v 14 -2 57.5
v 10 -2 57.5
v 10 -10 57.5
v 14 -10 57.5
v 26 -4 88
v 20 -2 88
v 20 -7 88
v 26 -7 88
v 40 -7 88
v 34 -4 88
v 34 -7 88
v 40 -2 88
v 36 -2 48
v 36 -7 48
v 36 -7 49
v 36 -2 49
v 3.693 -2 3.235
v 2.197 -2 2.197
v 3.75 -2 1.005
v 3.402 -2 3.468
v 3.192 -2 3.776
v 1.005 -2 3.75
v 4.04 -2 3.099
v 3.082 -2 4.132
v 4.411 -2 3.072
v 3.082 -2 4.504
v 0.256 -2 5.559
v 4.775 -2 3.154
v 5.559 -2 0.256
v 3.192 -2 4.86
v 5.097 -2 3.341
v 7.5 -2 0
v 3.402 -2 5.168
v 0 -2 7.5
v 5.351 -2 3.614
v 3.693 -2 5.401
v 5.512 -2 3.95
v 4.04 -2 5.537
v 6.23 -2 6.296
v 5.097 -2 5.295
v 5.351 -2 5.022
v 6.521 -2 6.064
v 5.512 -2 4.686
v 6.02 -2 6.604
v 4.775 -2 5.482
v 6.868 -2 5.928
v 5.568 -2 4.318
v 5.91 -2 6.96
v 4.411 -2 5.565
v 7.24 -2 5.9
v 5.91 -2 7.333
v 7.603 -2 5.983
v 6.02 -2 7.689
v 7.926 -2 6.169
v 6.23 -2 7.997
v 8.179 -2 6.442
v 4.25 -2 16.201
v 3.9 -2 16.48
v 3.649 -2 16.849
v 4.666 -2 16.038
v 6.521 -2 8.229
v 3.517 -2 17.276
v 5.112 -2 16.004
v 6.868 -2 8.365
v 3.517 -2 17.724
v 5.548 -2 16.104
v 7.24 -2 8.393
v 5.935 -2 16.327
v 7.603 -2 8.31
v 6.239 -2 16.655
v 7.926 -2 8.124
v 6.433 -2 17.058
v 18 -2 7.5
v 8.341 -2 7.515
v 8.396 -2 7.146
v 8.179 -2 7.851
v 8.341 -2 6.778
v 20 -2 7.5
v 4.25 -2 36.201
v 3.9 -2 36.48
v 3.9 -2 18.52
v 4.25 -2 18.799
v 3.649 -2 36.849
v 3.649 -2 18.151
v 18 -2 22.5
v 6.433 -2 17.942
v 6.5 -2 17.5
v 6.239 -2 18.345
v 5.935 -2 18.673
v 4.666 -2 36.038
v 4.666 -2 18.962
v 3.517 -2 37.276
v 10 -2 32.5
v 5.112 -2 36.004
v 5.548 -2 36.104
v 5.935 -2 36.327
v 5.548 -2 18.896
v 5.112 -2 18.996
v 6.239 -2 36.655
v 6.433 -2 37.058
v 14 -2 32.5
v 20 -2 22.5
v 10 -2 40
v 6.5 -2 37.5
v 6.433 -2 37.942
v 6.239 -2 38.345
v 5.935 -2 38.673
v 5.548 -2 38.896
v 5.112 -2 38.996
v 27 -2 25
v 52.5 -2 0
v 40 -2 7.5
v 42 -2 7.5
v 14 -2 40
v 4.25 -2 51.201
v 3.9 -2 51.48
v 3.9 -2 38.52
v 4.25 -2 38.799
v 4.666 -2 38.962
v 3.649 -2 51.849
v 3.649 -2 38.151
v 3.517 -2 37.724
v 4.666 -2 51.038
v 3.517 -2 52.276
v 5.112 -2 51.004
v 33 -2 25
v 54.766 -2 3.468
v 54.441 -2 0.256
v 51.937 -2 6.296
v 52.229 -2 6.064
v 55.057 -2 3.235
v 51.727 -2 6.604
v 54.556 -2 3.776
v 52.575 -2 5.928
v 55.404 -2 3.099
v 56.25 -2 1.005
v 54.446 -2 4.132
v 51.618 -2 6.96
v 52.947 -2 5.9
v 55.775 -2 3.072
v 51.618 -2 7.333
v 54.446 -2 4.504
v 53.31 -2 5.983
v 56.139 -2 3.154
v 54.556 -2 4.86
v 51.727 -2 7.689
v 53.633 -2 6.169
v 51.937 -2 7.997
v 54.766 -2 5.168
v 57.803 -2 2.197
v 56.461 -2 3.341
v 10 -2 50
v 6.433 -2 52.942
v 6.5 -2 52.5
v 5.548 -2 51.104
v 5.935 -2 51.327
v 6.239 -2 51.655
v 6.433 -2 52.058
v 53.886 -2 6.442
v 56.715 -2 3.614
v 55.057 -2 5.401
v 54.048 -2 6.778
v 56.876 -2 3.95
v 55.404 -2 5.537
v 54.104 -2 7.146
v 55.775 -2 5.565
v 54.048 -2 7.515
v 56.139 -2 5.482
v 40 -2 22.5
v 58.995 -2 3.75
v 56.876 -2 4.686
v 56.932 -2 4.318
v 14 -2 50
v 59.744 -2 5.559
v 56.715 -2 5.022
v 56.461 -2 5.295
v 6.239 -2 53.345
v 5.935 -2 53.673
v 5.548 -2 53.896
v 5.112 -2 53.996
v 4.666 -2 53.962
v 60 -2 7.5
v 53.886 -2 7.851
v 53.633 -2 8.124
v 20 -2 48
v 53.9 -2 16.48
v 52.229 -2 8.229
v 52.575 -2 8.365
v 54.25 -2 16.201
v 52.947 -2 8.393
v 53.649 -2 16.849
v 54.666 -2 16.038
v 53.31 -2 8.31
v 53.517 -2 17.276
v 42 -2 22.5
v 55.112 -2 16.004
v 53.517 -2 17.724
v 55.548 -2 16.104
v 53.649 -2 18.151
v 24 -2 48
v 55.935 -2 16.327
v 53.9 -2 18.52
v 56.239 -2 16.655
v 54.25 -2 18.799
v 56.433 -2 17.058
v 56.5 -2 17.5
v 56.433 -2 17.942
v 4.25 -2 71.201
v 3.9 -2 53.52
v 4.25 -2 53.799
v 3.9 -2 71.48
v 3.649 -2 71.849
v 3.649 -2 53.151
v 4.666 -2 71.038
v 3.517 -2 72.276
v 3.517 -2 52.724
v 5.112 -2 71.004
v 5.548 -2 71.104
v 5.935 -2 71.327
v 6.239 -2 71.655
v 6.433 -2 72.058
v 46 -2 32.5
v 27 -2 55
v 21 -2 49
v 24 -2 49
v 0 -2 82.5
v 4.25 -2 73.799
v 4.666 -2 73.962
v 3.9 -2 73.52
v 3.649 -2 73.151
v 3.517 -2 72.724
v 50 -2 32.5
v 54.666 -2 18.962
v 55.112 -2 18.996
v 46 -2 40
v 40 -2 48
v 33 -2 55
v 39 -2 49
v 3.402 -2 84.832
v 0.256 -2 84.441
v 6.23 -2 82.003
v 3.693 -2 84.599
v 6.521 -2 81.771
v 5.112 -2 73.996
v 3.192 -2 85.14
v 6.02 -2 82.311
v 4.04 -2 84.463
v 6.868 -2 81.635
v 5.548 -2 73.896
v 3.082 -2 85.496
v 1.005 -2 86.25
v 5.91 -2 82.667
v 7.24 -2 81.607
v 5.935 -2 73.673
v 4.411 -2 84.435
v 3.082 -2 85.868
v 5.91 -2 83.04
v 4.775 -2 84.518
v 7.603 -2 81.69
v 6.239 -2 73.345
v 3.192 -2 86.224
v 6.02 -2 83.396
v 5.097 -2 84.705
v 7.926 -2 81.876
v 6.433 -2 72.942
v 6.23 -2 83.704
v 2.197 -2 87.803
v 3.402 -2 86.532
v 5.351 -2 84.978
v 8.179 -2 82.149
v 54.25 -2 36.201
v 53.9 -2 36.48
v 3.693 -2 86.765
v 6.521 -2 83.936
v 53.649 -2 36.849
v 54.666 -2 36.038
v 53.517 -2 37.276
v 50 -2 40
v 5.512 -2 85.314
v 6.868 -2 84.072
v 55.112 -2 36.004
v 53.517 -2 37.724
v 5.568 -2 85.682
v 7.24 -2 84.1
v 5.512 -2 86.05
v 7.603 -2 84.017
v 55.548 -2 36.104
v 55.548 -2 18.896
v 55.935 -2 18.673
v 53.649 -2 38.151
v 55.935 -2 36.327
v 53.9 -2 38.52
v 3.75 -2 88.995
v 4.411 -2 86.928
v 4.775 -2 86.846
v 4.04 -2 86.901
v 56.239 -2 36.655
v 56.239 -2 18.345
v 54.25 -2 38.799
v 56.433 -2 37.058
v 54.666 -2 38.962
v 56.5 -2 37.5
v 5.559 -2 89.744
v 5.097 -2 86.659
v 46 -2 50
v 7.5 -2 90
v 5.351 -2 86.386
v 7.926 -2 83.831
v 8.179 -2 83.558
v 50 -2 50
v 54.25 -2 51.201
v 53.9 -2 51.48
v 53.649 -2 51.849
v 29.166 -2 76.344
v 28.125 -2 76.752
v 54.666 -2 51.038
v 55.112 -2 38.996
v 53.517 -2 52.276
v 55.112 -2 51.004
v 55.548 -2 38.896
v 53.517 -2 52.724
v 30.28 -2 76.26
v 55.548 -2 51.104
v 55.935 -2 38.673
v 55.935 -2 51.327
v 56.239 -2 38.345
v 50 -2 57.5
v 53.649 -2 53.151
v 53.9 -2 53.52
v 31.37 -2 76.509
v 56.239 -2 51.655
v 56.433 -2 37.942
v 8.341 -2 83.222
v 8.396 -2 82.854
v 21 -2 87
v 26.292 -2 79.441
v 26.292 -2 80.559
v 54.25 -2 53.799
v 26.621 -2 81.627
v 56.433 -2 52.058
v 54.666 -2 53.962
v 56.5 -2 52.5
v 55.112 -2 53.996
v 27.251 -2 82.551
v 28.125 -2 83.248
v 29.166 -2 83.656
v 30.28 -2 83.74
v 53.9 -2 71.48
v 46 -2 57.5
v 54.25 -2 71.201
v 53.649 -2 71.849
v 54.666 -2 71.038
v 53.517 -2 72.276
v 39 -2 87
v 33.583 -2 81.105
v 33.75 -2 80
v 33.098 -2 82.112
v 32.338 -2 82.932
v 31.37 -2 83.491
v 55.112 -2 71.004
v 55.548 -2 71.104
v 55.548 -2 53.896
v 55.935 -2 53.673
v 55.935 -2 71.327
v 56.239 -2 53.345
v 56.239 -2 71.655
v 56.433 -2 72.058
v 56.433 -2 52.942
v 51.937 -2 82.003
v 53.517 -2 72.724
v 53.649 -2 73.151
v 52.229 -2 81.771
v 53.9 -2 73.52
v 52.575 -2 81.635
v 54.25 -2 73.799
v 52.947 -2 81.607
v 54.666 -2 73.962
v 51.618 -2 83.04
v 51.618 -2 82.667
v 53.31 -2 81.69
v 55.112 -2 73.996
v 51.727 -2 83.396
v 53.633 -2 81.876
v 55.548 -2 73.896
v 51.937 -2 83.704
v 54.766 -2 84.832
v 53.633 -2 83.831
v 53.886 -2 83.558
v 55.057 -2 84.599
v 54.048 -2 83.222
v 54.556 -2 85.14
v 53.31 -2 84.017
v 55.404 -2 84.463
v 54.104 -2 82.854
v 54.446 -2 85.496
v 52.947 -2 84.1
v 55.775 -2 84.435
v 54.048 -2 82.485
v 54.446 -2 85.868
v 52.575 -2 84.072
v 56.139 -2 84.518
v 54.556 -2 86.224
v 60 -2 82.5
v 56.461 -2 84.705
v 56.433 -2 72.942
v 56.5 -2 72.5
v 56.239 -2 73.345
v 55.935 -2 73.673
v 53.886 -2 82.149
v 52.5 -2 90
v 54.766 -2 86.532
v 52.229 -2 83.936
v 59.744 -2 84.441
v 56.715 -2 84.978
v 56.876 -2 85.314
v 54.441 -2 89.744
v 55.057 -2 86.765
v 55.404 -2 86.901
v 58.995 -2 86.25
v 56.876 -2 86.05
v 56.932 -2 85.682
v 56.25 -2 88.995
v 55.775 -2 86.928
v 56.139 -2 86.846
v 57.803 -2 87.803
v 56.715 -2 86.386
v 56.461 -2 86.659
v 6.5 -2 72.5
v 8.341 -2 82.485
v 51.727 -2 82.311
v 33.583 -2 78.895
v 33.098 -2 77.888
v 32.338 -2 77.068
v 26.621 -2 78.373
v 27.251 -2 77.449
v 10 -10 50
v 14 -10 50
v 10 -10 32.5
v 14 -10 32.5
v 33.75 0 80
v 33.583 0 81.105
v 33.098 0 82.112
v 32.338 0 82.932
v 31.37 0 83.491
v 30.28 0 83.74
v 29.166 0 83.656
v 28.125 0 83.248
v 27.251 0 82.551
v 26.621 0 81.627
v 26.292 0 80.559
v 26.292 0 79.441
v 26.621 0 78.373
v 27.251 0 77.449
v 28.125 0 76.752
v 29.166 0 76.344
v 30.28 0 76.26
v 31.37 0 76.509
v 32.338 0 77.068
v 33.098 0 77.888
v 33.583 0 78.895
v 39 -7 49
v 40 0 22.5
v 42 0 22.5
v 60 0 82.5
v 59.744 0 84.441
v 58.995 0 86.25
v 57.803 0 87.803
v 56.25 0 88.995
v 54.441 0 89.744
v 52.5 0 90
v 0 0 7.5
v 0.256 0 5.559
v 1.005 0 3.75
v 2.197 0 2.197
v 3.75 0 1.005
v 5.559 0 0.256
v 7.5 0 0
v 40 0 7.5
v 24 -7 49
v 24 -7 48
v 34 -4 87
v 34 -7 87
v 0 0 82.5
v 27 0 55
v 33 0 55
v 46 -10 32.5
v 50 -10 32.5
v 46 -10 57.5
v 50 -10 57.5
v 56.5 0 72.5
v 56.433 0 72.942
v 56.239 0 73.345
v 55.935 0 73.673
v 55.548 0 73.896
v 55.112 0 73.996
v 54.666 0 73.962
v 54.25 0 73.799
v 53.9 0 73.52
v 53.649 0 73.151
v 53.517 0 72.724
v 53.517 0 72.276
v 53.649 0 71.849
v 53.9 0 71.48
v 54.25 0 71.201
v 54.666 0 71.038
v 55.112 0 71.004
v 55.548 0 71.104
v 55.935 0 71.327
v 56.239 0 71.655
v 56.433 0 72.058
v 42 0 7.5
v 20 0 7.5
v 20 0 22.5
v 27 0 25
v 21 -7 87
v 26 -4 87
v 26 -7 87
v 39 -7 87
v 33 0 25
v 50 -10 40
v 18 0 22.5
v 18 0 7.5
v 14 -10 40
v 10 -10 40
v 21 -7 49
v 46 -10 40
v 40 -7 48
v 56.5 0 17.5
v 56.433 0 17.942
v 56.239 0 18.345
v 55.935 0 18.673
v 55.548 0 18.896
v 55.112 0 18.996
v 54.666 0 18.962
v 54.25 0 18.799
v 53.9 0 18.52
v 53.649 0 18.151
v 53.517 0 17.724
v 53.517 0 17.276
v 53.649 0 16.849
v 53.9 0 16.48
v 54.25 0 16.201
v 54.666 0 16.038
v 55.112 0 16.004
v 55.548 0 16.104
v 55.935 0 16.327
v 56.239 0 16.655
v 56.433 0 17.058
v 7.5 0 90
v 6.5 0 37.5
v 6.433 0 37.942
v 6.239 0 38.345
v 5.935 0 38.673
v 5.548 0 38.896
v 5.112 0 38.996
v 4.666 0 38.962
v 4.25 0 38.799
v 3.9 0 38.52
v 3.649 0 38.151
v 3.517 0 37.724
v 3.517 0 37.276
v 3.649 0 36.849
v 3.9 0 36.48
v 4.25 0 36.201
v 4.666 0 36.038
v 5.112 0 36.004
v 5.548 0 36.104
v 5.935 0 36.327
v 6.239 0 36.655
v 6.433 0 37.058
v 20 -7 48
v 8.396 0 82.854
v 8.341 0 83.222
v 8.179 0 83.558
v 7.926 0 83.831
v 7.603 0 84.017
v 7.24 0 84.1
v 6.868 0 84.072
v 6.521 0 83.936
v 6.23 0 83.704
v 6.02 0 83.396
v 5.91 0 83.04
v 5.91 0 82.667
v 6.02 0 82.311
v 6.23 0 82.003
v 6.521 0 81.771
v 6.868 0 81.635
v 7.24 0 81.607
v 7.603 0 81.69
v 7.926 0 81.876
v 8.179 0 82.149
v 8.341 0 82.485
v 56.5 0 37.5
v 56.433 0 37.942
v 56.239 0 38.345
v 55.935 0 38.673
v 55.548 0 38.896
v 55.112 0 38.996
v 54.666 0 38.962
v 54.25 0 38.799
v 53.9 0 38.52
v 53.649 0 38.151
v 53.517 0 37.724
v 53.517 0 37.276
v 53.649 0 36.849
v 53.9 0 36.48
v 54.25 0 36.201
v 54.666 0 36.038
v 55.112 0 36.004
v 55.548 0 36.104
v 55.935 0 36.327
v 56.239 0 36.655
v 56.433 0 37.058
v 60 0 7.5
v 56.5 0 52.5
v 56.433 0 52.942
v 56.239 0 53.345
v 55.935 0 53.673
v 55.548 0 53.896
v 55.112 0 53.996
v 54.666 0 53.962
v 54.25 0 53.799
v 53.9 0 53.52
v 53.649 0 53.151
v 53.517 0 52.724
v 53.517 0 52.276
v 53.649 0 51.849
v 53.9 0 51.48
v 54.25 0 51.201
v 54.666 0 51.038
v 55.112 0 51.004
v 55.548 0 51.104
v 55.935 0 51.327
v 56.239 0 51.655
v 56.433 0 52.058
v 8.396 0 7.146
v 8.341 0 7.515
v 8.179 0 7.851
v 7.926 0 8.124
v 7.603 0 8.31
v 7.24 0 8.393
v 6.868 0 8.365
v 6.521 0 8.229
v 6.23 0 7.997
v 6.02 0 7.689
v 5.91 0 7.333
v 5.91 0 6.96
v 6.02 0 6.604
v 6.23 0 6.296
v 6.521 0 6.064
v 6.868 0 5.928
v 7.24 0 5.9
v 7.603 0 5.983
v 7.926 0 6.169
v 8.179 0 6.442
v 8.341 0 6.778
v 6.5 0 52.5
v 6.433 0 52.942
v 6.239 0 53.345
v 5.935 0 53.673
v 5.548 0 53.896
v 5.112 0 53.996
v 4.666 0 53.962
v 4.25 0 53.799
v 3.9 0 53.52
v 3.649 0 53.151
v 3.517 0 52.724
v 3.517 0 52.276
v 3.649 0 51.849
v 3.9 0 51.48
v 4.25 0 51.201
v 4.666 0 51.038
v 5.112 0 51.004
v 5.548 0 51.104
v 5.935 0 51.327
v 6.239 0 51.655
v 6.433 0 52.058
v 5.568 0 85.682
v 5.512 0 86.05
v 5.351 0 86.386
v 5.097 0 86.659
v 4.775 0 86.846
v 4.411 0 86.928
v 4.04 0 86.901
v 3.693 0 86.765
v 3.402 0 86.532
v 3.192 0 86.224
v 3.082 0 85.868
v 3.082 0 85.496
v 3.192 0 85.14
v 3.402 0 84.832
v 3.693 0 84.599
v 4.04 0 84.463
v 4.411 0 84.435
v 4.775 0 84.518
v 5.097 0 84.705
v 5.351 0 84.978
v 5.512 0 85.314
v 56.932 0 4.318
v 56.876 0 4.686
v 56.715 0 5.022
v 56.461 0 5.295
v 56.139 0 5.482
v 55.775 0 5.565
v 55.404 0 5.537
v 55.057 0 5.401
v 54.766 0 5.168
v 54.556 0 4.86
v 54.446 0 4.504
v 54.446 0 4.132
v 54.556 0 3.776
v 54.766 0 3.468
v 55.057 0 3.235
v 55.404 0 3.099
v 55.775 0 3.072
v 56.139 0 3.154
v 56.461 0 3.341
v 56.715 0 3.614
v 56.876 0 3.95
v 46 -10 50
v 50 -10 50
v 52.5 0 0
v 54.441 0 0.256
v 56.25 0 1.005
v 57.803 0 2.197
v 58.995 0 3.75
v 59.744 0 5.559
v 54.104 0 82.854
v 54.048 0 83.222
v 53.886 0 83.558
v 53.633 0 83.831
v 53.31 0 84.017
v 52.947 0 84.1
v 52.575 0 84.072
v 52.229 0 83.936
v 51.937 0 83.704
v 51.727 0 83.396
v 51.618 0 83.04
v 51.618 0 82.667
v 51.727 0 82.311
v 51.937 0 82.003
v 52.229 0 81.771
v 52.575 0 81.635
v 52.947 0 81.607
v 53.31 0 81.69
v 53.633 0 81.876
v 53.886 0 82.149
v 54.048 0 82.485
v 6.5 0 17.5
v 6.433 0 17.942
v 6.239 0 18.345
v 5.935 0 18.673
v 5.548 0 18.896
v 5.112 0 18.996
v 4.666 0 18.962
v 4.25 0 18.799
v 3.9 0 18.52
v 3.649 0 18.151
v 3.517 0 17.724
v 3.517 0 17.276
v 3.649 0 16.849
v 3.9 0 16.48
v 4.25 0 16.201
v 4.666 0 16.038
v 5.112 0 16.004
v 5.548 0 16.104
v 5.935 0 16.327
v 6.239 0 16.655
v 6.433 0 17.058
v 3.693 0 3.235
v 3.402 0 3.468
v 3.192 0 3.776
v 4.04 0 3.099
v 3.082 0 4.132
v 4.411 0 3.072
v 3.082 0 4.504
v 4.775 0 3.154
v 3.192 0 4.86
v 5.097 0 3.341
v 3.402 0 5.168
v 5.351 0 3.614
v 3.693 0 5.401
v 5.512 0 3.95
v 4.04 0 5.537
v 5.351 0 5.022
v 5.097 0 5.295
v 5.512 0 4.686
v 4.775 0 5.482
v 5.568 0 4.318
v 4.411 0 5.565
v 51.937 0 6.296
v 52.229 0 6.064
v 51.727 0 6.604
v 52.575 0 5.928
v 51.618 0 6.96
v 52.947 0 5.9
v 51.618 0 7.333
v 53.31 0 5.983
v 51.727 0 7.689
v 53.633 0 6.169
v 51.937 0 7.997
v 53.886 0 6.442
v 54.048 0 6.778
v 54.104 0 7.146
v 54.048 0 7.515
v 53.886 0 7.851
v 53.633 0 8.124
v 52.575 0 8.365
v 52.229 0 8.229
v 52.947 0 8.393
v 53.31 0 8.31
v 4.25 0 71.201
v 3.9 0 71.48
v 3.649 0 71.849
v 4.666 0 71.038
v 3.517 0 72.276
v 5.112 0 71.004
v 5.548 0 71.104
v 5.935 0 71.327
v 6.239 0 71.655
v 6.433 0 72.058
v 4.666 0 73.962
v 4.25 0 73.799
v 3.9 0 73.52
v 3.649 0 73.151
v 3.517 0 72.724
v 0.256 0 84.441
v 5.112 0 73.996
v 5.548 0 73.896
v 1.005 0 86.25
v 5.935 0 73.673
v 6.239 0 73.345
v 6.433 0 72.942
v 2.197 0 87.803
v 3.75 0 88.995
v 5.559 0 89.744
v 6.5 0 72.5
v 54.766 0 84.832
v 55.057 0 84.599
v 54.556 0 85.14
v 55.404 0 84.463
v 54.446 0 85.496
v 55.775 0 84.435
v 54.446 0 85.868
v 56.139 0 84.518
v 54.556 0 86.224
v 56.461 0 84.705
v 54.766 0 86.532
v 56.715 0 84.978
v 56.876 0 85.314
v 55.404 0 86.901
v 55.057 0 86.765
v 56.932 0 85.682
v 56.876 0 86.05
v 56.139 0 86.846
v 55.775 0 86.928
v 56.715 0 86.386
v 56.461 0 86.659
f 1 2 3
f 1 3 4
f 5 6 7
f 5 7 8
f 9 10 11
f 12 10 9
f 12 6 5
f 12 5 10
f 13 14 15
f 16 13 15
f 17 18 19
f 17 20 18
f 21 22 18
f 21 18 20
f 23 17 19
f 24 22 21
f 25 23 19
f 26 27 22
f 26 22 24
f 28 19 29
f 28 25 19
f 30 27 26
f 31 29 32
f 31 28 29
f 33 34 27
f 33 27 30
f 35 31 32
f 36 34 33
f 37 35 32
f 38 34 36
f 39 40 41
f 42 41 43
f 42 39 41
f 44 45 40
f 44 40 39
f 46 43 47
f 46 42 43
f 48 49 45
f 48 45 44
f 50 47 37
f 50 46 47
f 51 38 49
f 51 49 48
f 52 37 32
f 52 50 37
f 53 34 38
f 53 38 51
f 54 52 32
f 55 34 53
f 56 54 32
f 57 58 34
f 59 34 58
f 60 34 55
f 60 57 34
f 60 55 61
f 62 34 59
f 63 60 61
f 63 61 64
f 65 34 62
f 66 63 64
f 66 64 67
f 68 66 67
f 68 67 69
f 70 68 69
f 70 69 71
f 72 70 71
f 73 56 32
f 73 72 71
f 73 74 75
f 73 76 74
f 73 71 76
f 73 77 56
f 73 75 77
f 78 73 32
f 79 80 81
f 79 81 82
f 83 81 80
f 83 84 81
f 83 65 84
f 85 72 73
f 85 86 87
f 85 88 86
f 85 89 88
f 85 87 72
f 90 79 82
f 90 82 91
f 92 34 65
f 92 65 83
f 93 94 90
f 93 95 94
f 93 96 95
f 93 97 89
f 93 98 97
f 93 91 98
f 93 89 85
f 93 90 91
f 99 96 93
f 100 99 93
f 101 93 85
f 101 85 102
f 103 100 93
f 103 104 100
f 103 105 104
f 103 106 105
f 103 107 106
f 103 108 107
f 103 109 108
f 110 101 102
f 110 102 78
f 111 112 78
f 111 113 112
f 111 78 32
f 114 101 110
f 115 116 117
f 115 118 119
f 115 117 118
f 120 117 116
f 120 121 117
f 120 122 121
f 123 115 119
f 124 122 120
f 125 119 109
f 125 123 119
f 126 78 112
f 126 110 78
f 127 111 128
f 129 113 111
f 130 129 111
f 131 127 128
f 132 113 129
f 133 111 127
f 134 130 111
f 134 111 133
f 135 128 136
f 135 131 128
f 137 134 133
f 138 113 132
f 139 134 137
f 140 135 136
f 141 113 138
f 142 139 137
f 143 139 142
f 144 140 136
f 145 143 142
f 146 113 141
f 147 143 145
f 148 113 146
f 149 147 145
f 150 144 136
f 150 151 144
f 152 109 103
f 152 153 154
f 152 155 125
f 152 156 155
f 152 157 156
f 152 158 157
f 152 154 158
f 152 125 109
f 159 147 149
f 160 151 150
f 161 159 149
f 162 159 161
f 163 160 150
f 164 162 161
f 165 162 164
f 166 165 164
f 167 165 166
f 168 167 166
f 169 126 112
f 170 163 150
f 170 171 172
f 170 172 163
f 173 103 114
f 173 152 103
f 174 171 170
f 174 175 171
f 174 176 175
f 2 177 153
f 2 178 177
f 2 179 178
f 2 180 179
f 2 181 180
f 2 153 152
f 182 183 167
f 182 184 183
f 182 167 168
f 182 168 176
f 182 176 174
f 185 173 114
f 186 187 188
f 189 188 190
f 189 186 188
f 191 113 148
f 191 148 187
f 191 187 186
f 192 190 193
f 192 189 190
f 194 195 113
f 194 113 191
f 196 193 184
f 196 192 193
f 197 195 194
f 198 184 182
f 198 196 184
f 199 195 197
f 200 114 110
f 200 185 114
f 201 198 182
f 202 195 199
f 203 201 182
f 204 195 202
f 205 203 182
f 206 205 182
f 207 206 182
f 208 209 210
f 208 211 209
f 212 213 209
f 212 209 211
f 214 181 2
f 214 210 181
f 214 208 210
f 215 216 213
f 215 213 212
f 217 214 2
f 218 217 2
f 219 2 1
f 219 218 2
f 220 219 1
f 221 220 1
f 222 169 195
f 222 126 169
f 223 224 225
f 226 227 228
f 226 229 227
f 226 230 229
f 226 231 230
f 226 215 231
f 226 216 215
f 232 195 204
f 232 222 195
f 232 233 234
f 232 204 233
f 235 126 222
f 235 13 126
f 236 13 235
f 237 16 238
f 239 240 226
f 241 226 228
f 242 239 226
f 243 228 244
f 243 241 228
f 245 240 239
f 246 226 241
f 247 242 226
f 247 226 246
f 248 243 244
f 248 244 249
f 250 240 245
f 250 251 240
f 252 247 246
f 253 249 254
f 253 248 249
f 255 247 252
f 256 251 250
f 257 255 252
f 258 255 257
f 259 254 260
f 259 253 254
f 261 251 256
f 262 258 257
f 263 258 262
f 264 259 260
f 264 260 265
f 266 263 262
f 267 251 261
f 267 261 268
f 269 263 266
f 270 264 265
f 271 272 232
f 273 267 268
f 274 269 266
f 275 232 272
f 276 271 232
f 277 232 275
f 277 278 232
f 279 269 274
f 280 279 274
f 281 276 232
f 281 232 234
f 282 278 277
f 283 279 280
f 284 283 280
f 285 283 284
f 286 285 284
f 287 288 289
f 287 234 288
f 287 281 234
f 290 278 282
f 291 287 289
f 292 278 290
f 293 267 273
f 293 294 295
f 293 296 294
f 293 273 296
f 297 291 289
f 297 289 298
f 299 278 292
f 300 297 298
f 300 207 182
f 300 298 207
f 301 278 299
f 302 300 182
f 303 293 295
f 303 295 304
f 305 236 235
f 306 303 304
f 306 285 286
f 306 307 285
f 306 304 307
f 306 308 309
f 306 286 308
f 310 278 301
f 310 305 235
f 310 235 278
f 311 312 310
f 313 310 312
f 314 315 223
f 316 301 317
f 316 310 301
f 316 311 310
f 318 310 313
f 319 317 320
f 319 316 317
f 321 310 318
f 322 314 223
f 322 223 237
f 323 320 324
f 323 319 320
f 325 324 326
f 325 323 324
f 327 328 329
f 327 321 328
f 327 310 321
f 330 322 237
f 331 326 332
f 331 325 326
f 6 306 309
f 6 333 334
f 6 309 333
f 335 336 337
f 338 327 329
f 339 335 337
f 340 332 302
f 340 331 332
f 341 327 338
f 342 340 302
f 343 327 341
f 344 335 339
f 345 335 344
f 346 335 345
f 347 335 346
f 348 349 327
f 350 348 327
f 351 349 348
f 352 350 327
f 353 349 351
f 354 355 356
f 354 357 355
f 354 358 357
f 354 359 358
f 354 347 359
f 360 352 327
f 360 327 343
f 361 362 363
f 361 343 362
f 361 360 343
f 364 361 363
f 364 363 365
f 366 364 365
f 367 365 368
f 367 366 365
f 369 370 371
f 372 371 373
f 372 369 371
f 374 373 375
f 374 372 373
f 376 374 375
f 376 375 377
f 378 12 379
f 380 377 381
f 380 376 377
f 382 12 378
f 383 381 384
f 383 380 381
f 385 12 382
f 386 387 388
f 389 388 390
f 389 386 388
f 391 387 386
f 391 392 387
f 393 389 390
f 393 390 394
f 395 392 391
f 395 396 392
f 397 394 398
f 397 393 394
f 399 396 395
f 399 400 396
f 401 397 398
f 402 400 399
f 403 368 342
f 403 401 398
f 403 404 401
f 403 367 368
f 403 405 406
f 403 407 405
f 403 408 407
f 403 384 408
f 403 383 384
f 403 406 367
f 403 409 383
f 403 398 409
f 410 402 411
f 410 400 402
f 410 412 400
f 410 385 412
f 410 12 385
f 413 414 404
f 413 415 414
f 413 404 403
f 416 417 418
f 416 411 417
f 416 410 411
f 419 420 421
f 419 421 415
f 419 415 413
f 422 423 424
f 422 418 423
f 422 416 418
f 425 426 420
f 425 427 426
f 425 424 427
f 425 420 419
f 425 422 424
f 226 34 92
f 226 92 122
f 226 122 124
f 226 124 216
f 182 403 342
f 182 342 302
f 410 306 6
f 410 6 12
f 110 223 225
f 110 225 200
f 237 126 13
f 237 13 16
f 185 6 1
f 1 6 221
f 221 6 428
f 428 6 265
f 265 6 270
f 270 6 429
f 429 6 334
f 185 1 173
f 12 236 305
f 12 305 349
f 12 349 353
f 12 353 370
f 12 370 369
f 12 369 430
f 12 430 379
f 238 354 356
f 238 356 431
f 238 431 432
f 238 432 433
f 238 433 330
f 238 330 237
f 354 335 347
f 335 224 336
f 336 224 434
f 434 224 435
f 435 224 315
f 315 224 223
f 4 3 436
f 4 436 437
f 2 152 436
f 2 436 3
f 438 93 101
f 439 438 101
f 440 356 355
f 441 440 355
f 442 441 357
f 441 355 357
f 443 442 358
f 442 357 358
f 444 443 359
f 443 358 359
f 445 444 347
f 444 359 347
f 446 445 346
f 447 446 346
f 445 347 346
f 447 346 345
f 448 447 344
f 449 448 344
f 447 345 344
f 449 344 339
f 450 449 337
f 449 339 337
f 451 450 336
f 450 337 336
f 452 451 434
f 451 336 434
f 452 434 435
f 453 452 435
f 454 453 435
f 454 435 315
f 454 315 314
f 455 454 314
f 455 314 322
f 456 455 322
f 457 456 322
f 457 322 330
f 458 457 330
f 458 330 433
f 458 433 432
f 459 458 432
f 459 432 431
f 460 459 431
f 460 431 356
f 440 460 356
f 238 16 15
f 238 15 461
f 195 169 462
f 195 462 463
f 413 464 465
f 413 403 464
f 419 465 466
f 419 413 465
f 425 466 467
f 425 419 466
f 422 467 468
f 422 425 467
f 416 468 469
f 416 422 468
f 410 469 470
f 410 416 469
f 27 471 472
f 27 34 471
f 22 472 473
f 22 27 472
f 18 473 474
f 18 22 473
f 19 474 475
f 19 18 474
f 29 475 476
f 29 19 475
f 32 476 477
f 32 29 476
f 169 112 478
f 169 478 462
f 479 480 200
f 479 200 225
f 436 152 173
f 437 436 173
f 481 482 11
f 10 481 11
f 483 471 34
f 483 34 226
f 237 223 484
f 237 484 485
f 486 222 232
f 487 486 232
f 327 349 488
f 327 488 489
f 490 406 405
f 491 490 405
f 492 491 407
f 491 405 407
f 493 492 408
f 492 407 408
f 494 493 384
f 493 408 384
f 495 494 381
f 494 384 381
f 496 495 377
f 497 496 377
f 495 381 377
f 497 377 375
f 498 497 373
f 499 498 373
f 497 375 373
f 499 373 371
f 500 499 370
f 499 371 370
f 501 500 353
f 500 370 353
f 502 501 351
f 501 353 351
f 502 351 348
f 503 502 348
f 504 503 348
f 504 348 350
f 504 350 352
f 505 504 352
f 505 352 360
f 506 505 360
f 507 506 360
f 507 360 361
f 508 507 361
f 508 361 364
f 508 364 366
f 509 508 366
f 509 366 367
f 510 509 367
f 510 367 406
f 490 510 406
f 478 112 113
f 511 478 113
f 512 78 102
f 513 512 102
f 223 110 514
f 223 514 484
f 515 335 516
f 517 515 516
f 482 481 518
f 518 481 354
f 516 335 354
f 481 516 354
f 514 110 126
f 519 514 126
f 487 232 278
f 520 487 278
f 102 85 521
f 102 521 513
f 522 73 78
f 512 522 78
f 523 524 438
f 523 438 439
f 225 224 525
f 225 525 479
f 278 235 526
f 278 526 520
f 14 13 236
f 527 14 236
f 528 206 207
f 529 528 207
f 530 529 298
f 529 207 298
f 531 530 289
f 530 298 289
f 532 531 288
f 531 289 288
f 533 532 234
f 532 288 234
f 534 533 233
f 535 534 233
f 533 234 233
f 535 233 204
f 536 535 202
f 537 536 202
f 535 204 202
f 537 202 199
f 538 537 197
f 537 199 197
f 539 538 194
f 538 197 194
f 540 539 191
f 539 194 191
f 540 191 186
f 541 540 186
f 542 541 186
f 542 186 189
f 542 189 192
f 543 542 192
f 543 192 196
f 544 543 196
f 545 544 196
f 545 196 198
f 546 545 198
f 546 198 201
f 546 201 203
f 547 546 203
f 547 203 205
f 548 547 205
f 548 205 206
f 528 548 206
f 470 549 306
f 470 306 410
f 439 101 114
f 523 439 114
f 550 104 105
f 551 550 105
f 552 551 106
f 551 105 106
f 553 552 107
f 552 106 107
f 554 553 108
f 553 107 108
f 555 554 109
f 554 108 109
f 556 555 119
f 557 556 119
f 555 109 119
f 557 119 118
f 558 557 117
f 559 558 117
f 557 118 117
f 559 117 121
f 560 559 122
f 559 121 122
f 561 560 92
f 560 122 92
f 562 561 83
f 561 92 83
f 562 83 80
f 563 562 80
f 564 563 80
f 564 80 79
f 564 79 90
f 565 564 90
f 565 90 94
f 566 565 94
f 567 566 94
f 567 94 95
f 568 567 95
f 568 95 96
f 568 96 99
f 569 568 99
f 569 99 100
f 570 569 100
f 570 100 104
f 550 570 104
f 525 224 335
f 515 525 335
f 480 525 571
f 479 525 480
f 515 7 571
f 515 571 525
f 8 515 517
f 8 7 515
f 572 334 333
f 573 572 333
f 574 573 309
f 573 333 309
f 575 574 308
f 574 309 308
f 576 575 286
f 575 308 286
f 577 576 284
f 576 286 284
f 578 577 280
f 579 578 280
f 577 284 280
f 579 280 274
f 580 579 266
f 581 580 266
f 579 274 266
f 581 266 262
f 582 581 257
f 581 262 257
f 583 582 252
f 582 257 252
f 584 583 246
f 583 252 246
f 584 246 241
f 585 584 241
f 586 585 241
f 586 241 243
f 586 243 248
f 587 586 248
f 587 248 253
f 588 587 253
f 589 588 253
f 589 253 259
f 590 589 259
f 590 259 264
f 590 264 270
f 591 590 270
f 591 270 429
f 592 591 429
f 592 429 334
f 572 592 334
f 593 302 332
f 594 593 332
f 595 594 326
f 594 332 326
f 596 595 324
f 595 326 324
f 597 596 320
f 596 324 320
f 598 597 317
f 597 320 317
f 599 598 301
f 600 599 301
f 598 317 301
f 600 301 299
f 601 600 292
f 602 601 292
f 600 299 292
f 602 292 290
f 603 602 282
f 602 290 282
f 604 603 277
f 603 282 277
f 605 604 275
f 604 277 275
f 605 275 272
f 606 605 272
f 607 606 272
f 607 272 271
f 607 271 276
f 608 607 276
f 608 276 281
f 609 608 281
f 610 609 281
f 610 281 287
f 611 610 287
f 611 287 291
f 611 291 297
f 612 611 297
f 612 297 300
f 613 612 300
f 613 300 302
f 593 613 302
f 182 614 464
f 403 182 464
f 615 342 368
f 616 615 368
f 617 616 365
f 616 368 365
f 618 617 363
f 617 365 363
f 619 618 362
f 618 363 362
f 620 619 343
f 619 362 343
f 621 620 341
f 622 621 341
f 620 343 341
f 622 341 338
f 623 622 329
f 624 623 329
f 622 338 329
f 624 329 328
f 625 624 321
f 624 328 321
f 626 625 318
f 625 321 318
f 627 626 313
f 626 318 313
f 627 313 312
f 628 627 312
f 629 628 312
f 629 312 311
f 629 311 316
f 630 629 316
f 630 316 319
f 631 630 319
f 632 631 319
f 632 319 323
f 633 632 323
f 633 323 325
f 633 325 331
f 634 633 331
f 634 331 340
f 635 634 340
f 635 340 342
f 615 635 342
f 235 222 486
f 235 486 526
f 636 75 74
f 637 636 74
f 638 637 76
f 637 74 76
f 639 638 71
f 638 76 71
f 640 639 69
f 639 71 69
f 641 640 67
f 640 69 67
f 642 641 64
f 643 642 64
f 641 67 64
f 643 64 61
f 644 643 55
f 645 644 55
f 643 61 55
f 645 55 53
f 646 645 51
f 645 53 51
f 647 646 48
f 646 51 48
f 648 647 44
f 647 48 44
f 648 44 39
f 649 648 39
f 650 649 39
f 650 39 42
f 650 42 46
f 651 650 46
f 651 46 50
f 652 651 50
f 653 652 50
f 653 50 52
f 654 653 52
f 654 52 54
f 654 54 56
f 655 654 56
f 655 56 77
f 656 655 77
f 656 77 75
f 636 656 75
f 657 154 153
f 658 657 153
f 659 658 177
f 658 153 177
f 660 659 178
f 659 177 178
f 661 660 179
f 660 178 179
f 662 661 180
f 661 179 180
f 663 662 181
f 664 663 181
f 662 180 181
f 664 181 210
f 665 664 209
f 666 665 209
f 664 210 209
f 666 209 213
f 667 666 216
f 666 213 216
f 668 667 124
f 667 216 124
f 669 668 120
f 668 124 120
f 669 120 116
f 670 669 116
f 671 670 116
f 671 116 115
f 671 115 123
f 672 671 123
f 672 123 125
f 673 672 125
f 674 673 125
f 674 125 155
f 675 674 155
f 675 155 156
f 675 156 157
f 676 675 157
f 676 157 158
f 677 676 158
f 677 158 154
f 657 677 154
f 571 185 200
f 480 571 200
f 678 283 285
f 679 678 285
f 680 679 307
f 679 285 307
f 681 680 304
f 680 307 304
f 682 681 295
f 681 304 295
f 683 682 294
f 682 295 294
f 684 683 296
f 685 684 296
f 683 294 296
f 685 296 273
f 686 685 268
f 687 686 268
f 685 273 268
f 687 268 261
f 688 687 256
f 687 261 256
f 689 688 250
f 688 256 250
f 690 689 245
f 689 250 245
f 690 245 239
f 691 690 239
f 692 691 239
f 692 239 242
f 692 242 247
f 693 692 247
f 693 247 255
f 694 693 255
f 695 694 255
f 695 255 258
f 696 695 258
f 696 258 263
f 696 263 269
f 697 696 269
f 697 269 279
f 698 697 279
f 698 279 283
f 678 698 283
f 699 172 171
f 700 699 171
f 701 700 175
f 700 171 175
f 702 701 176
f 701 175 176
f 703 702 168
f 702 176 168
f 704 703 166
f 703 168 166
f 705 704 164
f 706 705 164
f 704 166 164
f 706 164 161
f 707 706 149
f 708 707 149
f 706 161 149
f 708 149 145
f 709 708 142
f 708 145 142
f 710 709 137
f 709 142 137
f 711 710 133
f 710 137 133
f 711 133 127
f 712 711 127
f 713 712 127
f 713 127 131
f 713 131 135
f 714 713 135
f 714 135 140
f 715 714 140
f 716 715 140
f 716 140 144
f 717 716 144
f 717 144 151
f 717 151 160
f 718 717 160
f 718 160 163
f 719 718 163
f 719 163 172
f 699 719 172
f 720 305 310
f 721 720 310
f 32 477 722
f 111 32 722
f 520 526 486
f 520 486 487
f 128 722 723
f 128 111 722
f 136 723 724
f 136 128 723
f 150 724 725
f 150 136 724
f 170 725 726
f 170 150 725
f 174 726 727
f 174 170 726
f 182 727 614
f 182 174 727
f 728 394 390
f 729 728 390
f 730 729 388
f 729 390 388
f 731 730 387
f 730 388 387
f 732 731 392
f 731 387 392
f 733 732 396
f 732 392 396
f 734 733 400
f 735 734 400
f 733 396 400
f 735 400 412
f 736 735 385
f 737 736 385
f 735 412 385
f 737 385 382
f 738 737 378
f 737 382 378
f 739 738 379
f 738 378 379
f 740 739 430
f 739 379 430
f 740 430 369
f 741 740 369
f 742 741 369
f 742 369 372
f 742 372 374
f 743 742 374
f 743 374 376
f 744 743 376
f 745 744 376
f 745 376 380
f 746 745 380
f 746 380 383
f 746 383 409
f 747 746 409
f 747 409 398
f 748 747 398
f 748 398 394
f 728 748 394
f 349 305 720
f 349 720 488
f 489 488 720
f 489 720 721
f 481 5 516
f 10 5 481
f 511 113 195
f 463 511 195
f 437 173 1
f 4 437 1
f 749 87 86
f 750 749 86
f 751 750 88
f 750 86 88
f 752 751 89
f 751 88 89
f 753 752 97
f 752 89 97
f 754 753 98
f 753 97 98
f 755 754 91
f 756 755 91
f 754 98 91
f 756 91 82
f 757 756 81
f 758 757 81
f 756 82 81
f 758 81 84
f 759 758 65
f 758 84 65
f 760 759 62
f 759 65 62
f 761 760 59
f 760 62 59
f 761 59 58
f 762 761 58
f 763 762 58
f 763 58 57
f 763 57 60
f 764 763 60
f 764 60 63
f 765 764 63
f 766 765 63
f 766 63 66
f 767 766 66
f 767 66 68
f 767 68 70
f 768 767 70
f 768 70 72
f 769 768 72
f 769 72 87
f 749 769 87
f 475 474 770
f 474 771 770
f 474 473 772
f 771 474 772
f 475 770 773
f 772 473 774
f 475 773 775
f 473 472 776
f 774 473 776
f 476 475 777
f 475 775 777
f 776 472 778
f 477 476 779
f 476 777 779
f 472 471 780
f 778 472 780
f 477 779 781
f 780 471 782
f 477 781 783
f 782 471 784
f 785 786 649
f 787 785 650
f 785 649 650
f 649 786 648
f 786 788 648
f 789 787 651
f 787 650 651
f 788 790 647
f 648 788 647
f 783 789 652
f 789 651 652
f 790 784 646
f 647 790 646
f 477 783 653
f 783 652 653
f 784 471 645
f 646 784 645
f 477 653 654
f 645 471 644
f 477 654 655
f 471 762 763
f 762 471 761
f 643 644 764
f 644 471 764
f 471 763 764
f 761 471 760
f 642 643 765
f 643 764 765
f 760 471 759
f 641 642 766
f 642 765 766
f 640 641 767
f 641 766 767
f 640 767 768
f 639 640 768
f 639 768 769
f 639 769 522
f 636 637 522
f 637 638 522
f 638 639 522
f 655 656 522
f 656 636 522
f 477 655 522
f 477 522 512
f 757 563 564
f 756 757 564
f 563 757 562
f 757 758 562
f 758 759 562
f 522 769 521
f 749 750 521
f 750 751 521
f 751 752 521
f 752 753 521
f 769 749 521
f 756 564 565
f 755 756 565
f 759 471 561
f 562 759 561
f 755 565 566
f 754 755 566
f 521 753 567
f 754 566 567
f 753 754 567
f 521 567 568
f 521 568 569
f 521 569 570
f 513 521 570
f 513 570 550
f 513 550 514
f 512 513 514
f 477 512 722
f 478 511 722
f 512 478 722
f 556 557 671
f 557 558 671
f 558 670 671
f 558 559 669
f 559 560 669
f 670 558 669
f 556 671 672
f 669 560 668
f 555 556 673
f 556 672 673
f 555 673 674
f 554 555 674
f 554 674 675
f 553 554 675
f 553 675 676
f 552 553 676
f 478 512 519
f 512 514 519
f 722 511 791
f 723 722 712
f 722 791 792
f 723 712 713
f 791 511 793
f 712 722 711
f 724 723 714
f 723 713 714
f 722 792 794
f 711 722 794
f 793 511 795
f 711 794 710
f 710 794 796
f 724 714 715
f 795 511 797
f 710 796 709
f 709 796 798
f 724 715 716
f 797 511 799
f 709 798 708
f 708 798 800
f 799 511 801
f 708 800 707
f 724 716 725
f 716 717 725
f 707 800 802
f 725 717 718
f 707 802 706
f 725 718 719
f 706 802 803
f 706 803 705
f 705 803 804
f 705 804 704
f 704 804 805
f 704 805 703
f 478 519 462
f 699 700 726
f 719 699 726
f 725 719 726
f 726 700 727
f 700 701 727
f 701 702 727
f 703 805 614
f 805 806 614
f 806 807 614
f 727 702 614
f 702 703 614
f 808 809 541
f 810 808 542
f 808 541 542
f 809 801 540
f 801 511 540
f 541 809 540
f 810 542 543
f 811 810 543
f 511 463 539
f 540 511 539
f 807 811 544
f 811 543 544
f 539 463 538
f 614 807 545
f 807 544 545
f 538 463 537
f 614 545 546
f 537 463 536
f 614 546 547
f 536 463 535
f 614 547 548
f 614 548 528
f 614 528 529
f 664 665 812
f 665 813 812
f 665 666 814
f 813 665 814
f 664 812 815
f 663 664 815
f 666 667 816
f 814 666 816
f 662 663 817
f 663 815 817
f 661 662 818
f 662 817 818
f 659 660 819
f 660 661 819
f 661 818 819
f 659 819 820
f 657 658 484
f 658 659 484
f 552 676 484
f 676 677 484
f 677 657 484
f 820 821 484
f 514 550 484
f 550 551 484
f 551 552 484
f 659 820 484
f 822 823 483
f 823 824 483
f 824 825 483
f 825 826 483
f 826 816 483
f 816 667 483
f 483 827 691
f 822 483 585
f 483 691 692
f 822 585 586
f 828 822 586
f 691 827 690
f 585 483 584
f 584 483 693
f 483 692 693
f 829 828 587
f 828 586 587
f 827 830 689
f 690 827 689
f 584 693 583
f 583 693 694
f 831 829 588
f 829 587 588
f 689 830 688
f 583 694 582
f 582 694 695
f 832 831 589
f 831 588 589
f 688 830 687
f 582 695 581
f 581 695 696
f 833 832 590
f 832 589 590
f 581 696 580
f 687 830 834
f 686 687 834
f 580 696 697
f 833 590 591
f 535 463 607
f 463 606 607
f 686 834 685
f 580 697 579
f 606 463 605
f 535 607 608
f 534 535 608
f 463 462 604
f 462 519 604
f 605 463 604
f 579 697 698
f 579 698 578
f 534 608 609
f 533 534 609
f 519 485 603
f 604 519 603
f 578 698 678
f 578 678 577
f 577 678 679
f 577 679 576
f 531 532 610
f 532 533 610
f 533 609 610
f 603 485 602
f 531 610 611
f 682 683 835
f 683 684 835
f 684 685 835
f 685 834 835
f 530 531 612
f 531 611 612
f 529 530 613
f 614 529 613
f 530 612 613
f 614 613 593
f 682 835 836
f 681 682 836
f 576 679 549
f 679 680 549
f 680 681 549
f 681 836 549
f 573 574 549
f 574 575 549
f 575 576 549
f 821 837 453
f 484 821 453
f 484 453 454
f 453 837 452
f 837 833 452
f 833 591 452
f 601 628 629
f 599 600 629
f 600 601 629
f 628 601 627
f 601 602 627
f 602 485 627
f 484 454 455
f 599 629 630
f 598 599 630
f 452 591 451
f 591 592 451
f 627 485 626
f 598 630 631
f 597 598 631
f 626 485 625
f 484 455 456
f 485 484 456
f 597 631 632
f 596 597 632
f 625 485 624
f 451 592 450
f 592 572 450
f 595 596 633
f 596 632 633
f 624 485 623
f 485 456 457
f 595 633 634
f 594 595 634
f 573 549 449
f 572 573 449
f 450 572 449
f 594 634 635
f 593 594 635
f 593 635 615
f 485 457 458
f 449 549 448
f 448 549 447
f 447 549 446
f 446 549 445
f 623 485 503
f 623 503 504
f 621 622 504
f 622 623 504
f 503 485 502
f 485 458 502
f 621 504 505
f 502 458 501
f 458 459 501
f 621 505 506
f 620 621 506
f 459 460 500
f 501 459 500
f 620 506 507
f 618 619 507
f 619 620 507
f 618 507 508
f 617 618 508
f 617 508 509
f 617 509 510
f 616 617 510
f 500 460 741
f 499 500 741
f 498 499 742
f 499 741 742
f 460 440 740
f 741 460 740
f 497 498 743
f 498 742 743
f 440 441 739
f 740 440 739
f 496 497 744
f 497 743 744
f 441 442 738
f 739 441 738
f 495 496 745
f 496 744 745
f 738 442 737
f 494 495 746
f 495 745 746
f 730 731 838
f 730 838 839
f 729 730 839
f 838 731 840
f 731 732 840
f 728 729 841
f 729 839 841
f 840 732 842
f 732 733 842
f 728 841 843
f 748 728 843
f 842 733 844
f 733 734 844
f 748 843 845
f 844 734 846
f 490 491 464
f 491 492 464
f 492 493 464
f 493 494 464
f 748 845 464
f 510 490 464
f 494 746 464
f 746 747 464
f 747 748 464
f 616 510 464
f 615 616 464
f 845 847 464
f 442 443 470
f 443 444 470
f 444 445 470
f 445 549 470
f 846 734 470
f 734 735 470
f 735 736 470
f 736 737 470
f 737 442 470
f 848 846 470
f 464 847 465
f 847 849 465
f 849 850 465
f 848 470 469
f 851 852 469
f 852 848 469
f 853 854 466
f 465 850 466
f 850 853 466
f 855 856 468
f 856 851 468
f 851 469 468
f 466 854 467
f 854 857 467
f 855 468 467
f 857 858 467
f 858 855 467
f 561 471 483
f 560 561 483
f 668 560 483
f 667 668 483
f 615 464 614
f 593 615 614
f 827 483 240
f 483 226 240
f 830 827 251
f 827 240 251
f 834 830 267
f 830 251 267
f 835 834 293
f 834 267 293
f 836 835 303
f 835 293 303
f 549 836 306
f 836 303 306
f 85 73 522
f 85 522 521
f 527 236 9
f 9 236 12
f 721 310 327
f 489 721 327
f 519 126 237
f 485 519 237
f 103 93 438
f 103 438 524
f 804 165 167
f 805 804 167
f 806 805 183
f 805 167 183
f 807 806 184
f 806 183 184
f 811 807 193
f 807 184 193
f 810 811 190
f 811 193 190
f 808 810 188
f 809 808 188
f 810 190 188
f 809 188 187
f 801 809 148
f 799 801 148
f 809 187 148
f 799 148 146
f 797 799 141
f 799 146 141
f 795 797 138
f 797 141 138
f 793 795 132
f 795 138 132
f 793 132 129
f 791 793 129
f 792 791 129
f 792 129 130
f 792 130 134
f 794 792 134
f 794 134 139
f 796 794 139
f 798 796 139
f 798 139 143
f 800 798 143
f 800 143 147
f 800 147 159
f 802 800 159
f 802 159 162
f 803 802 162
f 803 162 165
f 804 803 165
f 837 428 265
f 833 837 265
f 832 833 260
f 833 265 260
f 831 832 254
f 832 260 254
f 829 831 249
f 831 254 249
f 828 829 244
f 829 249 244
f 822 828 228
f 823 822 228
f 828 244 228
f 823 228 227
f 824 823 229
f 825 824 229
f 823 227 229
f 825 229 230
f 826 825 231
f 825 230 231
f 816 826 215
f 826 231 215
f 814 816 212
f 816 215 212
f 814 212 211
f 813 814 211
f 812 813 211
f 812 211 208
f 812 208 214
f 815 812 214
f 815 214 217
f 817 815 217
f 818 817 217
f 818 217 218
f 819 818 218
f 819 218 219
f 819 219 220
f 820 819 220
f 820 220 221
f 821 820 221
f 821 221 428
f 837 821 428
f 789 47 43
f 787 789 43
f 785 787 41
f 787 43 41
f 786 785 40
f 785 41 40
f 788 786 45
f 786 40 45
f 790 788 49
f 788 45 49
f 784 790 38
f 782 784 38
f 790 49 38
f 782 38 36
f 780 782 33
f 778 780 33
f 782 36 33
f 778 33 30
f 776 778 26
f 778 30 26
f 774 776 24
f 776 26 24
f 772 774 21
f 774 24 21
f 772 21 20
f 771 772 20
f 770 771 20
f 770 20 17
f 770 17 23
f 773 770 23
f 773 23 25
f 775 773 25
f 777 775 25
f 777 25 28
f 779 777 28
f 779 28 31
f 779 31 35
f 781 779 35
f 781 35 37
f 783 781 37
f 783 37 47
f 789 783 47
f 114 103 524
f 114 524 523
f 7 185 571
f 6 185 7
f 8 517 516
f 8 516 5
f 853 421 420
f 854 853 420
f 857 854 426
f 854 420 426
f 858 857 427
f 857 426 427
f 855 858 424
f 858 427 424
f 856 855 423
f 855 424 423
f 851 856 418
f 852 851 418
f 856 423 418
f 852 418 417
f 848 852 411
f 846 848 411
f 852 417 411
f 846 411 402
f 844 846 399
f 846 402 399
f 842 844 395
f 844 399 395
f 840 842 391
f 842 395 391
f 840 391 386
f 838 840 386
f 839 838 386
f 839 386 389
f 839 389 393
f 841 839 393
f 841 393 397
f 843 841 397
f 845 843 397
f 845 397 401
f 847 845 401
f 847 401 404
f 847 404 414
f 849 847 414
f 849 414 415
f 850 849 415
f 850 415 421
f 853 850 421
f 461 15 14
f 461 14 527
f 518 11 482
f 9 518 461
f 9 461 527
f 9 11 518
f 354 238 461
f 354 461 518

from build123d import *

# Parameters (mm, degrees)
F0_W      = 60
F0_H      = 90
F1_DEPTH  = 2
F2_R      = 7.5
F4_W      = 2
F4_H      = 15
F5_DEPTH  = 25
F6_W      = 20
F6_H      = 40
F6_W_2    = 18
F6_H_2    = 38
F7_DEPTH  = 5
F8_W      = 8
F8_H      = 1
F9_DEPTH  = 3
F10_W     = 12
F10_H     = 1
F11_DEPTH = 5
F12_R     = 1.25
F13_DEPTH = 25
F14_W     = 6
F14_H     = 30
F15_DEPTH = 25
F16_R     = 3.75
F17_DEPTH = 25
F18_R     = 1.5
F19_DEPTH = 25
F20_W     = 4
F20_H     = 25
F21_DEPTH = 8
F22_R     = 1.5
F23_DEPTH = 25
F24_W     = 4
F24_H     = 10
F25_DEPTH = 8


with BuildPart() as f1:
    # F0 (on Front) → F1 (new body)
    with BuildSketch(Plane.XZ):
        with Locations((30, 45)):
            Rectangle(F0_W, F0_H)
    extrude(amount=F1_DEPTH)

    # F2
    f2_edges = [f1.edges().sort_by_distance(p)[0] for p in [
        (0, -1, 90),
        (60, -1, 90),
        (60, -1, 0),
        (0, -1, 0),
    ]]
    fillet(f2_edges, radius=F2_R)

    # F4 (on face) → F5 (cut)
    with BuildSketch(Plane.XZ.offset(2)):
        with Locations((19, 15)):
            Rectangle(F4_W, F4_H)
        with Locations((41, 15)):
            Rectangle(F4_W, F4_H)
    extrude(amount=-F5_DEPTH, mode=Mode.SUBTRACT)

    # F6 (on face) → F7 (join)
    with BuildSketch(Plane.XZ.offset(2)):
        with Locations((30, 68)):
            Rectangle(F6_W, F6_H)
        with Locations((30, 68)):
            Rectangle(F6_W_2, F6_H_2, mode=Mode.SUBTRACT)
    extrude(amount=F7_DEPTH)

    # F8 (on face) → F9 (cut)
    with BuildSketch(Plane.XZ.offset(7)):
        with Locations((30, 87.5)):
            Rectangle(F8_W, F8_H)
    extrude(amount=-F9_DEPTH, mode=Mode.SUBTRACT)

    # F10 (on face) → F11 (cut)
    with BuildSketch(Plane.XZ.offset(7)):
        with Locations((30, 48.5)):
            Rectangle(F10_W, F10_H)
    extrude(amount=-F11_DEPTH, mode=Mode.SUBTRACT)

    # F12 (on face) → F13 (cut)
    with BuildSketch(Plane.XZ.offset(2)):
        with Locations((7.146447, 82.853553)):
            Circle(F12_R)
        with Locations((52.853553, 82.853553)):
            Circle(F12_R)
        with Locations((55.681981, 4.318019)):
            Circle(F12_R)
        with Locations((4.318019, 4.318019)):
            Circle(F12_R)
        with Locations((7.146447, 7.146447)):
            Circle(F12_R)
        with Locations((52.853553, 7.146447)):
            Circle(F12_R)
        with Locations((55.681981, 85.681981)):
            Circle(F12_R)
        with Locations((4.318019, 85.681981)):
            Circle(F12_R)
    extrude(amount=-F13_DEPTH, mode=Mode.SUBTRACT)

    # F14 (on face) → F15 (cut)
    with BuildSketch(Plane.XZ.offset(2)):
        with Locations((30, 40)):
            Rectangle(F14_W, F14_H)
    extrude(amount=-F15_DEPTH, mode=Mode.SUBTRACT)

    # F16 (on face) → F17 (cut)
    with BuildSketch(Plane.XZ.offset(2)):
        with Locations((30, 80)):
            Circle(F16_R)
    extrude(amount=-F17_DEPTH, mode=Mode.SUBTRACT)

    # F18 (on face) → F19 (cut)
    with BuildSketch(Plane.XZ.offset(2)):
        with Locations((5, 17.5)):
            Circle(F18_R)
        with Locations((5, 72.5)):
            Circle(F18_R)
        with Locations((55, 72.5)):
            Circle(F18_R)
        with Locations((55, 17.5)):
            Circle(F18_R)
    extrude(amount=-F19_DEPTH, mode=Mode.SUBTRACT)

    # F20 (on face) → F21 (join)
    with BuildSketch(Plane.XZ.offset(2)):
        with Locations((12, 45)):
            Rectangle(F20_W, F20_H)
        with Locations((48, 45)):
            Rectangle(F20_W, F20_H)
    extrude(amount=F21_DEPTH)

    # F22 (on face) → F23 (cut)
    with BuildSketch(Plane.XZ.offset(2)):
        with Locations((5, 52.5)):
            Circle(F22_R)
        with Locations((5, 37.5)):
            Circle(F22_R)
        with Locations((55, 52.5)):
            Circle(F22_R)
        with Locations((55, 37.5)):
            Circle(F22_R)
    extrude(amount=-F23_DEPTH, mode=Mode.SUBTRACT)

    # F24 (on face) → F25 (cut)
    with BuildSketch(Plane.XZ.offset(10)):
        with Locations((12, 45)):
            Rectangle(F24_W, F24_H)
        with Locations((48, 45)):
            Rectangle(F24_W, F24_H)
    extrude(amount=-F25_DEPTH, mode=Mode.SUBTRACT)


solid = f1.part
